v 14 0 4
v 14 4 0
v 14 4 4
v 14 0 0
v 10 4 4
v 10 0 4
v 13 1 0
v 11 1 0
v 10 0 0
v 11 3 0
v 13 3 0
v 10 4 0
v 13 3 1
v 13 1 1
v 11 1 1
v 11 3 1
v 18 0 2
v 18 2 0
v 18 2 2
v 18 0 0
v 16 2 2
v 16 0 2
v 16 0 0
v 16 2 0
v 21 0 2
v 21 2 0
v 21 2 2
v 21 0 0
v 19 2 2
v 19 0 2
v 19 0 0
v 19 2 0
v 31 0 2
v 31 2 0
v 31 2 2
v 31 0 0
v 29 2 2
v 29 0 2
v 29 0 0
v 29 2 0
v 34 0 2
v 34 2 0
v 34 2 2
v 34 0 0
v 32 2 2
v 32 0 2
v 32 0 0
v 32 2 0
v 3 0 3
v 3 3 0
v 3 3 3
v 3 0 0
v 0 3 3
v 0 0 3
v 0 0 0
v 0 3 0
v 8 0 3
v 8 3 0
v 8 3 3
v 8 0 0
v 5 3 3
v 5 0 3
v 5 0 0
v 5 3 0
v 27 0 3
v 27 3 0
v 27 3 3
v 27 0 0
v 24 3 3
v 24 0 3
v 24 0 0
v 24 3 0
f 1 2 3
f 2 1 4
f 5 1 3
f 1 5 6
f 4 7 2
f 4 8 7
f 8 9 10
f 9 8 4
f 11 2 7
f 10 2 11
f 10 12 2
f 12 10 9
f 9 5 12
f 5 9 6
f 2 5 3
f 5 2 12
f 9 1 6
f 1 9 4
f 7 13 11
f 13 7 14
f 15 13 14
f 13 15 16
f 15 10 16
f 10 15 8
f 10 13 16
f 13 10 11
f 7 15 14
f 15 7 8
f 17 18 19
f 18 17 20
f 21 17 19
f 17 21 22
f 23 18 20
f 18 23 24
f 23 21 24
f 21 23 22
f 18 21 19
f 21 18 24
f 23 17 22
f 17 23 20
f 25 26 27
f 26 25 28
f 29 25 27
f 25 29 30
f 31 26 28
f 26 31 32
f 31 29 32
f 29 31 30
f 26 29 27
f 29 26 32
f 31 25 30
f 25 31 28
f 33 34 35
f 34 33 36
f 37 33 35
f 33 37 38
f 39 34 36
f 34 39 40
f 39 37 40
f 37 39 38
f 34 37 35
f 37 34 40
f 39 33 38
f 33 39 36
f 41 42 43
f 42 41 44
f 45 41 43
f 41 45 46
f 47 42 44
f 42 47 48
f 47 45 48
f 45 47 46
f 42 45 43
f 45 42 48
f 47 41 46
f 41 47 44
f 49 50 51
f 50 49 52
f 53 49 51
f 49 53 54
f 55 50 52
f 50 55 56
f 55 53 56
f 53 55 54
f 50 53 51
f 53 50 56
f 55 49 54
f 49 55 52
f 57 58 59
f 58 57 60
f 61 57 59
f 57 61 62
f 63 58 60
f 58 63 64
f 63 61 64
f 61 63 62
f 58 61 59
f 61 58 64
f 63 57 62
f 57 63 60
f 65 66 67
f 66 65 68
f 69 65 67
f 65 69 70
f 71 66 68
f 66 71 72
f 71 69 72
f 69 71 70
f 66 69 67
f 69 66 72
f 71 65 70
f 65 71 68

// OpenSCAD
// `color`, `render`, `group` and `assert` are all transparent to the exported
// geometry: colour is a preview tint, `render` forces an exact sub-render,
// `group` is a plain container, and a passing `assert` just yields its children.
color("red", 0.5) cube(3);
translate([5,0,0]) color([0,1,0]) cube(3);
translate([10,0,0]) render(convexity = 3) difference() { cube(4); translate([1,1,-1]) cube(2); }
translate([16,0,0]) group() { cube(2); translate([3,0,0]) cube(2); }
translate([24,0,0]) assert(1 < 2, "must hold") cube(3);
translate([29,0,0]) assert(true) { cube(2); translate([3,0,0]) cube(2); }
